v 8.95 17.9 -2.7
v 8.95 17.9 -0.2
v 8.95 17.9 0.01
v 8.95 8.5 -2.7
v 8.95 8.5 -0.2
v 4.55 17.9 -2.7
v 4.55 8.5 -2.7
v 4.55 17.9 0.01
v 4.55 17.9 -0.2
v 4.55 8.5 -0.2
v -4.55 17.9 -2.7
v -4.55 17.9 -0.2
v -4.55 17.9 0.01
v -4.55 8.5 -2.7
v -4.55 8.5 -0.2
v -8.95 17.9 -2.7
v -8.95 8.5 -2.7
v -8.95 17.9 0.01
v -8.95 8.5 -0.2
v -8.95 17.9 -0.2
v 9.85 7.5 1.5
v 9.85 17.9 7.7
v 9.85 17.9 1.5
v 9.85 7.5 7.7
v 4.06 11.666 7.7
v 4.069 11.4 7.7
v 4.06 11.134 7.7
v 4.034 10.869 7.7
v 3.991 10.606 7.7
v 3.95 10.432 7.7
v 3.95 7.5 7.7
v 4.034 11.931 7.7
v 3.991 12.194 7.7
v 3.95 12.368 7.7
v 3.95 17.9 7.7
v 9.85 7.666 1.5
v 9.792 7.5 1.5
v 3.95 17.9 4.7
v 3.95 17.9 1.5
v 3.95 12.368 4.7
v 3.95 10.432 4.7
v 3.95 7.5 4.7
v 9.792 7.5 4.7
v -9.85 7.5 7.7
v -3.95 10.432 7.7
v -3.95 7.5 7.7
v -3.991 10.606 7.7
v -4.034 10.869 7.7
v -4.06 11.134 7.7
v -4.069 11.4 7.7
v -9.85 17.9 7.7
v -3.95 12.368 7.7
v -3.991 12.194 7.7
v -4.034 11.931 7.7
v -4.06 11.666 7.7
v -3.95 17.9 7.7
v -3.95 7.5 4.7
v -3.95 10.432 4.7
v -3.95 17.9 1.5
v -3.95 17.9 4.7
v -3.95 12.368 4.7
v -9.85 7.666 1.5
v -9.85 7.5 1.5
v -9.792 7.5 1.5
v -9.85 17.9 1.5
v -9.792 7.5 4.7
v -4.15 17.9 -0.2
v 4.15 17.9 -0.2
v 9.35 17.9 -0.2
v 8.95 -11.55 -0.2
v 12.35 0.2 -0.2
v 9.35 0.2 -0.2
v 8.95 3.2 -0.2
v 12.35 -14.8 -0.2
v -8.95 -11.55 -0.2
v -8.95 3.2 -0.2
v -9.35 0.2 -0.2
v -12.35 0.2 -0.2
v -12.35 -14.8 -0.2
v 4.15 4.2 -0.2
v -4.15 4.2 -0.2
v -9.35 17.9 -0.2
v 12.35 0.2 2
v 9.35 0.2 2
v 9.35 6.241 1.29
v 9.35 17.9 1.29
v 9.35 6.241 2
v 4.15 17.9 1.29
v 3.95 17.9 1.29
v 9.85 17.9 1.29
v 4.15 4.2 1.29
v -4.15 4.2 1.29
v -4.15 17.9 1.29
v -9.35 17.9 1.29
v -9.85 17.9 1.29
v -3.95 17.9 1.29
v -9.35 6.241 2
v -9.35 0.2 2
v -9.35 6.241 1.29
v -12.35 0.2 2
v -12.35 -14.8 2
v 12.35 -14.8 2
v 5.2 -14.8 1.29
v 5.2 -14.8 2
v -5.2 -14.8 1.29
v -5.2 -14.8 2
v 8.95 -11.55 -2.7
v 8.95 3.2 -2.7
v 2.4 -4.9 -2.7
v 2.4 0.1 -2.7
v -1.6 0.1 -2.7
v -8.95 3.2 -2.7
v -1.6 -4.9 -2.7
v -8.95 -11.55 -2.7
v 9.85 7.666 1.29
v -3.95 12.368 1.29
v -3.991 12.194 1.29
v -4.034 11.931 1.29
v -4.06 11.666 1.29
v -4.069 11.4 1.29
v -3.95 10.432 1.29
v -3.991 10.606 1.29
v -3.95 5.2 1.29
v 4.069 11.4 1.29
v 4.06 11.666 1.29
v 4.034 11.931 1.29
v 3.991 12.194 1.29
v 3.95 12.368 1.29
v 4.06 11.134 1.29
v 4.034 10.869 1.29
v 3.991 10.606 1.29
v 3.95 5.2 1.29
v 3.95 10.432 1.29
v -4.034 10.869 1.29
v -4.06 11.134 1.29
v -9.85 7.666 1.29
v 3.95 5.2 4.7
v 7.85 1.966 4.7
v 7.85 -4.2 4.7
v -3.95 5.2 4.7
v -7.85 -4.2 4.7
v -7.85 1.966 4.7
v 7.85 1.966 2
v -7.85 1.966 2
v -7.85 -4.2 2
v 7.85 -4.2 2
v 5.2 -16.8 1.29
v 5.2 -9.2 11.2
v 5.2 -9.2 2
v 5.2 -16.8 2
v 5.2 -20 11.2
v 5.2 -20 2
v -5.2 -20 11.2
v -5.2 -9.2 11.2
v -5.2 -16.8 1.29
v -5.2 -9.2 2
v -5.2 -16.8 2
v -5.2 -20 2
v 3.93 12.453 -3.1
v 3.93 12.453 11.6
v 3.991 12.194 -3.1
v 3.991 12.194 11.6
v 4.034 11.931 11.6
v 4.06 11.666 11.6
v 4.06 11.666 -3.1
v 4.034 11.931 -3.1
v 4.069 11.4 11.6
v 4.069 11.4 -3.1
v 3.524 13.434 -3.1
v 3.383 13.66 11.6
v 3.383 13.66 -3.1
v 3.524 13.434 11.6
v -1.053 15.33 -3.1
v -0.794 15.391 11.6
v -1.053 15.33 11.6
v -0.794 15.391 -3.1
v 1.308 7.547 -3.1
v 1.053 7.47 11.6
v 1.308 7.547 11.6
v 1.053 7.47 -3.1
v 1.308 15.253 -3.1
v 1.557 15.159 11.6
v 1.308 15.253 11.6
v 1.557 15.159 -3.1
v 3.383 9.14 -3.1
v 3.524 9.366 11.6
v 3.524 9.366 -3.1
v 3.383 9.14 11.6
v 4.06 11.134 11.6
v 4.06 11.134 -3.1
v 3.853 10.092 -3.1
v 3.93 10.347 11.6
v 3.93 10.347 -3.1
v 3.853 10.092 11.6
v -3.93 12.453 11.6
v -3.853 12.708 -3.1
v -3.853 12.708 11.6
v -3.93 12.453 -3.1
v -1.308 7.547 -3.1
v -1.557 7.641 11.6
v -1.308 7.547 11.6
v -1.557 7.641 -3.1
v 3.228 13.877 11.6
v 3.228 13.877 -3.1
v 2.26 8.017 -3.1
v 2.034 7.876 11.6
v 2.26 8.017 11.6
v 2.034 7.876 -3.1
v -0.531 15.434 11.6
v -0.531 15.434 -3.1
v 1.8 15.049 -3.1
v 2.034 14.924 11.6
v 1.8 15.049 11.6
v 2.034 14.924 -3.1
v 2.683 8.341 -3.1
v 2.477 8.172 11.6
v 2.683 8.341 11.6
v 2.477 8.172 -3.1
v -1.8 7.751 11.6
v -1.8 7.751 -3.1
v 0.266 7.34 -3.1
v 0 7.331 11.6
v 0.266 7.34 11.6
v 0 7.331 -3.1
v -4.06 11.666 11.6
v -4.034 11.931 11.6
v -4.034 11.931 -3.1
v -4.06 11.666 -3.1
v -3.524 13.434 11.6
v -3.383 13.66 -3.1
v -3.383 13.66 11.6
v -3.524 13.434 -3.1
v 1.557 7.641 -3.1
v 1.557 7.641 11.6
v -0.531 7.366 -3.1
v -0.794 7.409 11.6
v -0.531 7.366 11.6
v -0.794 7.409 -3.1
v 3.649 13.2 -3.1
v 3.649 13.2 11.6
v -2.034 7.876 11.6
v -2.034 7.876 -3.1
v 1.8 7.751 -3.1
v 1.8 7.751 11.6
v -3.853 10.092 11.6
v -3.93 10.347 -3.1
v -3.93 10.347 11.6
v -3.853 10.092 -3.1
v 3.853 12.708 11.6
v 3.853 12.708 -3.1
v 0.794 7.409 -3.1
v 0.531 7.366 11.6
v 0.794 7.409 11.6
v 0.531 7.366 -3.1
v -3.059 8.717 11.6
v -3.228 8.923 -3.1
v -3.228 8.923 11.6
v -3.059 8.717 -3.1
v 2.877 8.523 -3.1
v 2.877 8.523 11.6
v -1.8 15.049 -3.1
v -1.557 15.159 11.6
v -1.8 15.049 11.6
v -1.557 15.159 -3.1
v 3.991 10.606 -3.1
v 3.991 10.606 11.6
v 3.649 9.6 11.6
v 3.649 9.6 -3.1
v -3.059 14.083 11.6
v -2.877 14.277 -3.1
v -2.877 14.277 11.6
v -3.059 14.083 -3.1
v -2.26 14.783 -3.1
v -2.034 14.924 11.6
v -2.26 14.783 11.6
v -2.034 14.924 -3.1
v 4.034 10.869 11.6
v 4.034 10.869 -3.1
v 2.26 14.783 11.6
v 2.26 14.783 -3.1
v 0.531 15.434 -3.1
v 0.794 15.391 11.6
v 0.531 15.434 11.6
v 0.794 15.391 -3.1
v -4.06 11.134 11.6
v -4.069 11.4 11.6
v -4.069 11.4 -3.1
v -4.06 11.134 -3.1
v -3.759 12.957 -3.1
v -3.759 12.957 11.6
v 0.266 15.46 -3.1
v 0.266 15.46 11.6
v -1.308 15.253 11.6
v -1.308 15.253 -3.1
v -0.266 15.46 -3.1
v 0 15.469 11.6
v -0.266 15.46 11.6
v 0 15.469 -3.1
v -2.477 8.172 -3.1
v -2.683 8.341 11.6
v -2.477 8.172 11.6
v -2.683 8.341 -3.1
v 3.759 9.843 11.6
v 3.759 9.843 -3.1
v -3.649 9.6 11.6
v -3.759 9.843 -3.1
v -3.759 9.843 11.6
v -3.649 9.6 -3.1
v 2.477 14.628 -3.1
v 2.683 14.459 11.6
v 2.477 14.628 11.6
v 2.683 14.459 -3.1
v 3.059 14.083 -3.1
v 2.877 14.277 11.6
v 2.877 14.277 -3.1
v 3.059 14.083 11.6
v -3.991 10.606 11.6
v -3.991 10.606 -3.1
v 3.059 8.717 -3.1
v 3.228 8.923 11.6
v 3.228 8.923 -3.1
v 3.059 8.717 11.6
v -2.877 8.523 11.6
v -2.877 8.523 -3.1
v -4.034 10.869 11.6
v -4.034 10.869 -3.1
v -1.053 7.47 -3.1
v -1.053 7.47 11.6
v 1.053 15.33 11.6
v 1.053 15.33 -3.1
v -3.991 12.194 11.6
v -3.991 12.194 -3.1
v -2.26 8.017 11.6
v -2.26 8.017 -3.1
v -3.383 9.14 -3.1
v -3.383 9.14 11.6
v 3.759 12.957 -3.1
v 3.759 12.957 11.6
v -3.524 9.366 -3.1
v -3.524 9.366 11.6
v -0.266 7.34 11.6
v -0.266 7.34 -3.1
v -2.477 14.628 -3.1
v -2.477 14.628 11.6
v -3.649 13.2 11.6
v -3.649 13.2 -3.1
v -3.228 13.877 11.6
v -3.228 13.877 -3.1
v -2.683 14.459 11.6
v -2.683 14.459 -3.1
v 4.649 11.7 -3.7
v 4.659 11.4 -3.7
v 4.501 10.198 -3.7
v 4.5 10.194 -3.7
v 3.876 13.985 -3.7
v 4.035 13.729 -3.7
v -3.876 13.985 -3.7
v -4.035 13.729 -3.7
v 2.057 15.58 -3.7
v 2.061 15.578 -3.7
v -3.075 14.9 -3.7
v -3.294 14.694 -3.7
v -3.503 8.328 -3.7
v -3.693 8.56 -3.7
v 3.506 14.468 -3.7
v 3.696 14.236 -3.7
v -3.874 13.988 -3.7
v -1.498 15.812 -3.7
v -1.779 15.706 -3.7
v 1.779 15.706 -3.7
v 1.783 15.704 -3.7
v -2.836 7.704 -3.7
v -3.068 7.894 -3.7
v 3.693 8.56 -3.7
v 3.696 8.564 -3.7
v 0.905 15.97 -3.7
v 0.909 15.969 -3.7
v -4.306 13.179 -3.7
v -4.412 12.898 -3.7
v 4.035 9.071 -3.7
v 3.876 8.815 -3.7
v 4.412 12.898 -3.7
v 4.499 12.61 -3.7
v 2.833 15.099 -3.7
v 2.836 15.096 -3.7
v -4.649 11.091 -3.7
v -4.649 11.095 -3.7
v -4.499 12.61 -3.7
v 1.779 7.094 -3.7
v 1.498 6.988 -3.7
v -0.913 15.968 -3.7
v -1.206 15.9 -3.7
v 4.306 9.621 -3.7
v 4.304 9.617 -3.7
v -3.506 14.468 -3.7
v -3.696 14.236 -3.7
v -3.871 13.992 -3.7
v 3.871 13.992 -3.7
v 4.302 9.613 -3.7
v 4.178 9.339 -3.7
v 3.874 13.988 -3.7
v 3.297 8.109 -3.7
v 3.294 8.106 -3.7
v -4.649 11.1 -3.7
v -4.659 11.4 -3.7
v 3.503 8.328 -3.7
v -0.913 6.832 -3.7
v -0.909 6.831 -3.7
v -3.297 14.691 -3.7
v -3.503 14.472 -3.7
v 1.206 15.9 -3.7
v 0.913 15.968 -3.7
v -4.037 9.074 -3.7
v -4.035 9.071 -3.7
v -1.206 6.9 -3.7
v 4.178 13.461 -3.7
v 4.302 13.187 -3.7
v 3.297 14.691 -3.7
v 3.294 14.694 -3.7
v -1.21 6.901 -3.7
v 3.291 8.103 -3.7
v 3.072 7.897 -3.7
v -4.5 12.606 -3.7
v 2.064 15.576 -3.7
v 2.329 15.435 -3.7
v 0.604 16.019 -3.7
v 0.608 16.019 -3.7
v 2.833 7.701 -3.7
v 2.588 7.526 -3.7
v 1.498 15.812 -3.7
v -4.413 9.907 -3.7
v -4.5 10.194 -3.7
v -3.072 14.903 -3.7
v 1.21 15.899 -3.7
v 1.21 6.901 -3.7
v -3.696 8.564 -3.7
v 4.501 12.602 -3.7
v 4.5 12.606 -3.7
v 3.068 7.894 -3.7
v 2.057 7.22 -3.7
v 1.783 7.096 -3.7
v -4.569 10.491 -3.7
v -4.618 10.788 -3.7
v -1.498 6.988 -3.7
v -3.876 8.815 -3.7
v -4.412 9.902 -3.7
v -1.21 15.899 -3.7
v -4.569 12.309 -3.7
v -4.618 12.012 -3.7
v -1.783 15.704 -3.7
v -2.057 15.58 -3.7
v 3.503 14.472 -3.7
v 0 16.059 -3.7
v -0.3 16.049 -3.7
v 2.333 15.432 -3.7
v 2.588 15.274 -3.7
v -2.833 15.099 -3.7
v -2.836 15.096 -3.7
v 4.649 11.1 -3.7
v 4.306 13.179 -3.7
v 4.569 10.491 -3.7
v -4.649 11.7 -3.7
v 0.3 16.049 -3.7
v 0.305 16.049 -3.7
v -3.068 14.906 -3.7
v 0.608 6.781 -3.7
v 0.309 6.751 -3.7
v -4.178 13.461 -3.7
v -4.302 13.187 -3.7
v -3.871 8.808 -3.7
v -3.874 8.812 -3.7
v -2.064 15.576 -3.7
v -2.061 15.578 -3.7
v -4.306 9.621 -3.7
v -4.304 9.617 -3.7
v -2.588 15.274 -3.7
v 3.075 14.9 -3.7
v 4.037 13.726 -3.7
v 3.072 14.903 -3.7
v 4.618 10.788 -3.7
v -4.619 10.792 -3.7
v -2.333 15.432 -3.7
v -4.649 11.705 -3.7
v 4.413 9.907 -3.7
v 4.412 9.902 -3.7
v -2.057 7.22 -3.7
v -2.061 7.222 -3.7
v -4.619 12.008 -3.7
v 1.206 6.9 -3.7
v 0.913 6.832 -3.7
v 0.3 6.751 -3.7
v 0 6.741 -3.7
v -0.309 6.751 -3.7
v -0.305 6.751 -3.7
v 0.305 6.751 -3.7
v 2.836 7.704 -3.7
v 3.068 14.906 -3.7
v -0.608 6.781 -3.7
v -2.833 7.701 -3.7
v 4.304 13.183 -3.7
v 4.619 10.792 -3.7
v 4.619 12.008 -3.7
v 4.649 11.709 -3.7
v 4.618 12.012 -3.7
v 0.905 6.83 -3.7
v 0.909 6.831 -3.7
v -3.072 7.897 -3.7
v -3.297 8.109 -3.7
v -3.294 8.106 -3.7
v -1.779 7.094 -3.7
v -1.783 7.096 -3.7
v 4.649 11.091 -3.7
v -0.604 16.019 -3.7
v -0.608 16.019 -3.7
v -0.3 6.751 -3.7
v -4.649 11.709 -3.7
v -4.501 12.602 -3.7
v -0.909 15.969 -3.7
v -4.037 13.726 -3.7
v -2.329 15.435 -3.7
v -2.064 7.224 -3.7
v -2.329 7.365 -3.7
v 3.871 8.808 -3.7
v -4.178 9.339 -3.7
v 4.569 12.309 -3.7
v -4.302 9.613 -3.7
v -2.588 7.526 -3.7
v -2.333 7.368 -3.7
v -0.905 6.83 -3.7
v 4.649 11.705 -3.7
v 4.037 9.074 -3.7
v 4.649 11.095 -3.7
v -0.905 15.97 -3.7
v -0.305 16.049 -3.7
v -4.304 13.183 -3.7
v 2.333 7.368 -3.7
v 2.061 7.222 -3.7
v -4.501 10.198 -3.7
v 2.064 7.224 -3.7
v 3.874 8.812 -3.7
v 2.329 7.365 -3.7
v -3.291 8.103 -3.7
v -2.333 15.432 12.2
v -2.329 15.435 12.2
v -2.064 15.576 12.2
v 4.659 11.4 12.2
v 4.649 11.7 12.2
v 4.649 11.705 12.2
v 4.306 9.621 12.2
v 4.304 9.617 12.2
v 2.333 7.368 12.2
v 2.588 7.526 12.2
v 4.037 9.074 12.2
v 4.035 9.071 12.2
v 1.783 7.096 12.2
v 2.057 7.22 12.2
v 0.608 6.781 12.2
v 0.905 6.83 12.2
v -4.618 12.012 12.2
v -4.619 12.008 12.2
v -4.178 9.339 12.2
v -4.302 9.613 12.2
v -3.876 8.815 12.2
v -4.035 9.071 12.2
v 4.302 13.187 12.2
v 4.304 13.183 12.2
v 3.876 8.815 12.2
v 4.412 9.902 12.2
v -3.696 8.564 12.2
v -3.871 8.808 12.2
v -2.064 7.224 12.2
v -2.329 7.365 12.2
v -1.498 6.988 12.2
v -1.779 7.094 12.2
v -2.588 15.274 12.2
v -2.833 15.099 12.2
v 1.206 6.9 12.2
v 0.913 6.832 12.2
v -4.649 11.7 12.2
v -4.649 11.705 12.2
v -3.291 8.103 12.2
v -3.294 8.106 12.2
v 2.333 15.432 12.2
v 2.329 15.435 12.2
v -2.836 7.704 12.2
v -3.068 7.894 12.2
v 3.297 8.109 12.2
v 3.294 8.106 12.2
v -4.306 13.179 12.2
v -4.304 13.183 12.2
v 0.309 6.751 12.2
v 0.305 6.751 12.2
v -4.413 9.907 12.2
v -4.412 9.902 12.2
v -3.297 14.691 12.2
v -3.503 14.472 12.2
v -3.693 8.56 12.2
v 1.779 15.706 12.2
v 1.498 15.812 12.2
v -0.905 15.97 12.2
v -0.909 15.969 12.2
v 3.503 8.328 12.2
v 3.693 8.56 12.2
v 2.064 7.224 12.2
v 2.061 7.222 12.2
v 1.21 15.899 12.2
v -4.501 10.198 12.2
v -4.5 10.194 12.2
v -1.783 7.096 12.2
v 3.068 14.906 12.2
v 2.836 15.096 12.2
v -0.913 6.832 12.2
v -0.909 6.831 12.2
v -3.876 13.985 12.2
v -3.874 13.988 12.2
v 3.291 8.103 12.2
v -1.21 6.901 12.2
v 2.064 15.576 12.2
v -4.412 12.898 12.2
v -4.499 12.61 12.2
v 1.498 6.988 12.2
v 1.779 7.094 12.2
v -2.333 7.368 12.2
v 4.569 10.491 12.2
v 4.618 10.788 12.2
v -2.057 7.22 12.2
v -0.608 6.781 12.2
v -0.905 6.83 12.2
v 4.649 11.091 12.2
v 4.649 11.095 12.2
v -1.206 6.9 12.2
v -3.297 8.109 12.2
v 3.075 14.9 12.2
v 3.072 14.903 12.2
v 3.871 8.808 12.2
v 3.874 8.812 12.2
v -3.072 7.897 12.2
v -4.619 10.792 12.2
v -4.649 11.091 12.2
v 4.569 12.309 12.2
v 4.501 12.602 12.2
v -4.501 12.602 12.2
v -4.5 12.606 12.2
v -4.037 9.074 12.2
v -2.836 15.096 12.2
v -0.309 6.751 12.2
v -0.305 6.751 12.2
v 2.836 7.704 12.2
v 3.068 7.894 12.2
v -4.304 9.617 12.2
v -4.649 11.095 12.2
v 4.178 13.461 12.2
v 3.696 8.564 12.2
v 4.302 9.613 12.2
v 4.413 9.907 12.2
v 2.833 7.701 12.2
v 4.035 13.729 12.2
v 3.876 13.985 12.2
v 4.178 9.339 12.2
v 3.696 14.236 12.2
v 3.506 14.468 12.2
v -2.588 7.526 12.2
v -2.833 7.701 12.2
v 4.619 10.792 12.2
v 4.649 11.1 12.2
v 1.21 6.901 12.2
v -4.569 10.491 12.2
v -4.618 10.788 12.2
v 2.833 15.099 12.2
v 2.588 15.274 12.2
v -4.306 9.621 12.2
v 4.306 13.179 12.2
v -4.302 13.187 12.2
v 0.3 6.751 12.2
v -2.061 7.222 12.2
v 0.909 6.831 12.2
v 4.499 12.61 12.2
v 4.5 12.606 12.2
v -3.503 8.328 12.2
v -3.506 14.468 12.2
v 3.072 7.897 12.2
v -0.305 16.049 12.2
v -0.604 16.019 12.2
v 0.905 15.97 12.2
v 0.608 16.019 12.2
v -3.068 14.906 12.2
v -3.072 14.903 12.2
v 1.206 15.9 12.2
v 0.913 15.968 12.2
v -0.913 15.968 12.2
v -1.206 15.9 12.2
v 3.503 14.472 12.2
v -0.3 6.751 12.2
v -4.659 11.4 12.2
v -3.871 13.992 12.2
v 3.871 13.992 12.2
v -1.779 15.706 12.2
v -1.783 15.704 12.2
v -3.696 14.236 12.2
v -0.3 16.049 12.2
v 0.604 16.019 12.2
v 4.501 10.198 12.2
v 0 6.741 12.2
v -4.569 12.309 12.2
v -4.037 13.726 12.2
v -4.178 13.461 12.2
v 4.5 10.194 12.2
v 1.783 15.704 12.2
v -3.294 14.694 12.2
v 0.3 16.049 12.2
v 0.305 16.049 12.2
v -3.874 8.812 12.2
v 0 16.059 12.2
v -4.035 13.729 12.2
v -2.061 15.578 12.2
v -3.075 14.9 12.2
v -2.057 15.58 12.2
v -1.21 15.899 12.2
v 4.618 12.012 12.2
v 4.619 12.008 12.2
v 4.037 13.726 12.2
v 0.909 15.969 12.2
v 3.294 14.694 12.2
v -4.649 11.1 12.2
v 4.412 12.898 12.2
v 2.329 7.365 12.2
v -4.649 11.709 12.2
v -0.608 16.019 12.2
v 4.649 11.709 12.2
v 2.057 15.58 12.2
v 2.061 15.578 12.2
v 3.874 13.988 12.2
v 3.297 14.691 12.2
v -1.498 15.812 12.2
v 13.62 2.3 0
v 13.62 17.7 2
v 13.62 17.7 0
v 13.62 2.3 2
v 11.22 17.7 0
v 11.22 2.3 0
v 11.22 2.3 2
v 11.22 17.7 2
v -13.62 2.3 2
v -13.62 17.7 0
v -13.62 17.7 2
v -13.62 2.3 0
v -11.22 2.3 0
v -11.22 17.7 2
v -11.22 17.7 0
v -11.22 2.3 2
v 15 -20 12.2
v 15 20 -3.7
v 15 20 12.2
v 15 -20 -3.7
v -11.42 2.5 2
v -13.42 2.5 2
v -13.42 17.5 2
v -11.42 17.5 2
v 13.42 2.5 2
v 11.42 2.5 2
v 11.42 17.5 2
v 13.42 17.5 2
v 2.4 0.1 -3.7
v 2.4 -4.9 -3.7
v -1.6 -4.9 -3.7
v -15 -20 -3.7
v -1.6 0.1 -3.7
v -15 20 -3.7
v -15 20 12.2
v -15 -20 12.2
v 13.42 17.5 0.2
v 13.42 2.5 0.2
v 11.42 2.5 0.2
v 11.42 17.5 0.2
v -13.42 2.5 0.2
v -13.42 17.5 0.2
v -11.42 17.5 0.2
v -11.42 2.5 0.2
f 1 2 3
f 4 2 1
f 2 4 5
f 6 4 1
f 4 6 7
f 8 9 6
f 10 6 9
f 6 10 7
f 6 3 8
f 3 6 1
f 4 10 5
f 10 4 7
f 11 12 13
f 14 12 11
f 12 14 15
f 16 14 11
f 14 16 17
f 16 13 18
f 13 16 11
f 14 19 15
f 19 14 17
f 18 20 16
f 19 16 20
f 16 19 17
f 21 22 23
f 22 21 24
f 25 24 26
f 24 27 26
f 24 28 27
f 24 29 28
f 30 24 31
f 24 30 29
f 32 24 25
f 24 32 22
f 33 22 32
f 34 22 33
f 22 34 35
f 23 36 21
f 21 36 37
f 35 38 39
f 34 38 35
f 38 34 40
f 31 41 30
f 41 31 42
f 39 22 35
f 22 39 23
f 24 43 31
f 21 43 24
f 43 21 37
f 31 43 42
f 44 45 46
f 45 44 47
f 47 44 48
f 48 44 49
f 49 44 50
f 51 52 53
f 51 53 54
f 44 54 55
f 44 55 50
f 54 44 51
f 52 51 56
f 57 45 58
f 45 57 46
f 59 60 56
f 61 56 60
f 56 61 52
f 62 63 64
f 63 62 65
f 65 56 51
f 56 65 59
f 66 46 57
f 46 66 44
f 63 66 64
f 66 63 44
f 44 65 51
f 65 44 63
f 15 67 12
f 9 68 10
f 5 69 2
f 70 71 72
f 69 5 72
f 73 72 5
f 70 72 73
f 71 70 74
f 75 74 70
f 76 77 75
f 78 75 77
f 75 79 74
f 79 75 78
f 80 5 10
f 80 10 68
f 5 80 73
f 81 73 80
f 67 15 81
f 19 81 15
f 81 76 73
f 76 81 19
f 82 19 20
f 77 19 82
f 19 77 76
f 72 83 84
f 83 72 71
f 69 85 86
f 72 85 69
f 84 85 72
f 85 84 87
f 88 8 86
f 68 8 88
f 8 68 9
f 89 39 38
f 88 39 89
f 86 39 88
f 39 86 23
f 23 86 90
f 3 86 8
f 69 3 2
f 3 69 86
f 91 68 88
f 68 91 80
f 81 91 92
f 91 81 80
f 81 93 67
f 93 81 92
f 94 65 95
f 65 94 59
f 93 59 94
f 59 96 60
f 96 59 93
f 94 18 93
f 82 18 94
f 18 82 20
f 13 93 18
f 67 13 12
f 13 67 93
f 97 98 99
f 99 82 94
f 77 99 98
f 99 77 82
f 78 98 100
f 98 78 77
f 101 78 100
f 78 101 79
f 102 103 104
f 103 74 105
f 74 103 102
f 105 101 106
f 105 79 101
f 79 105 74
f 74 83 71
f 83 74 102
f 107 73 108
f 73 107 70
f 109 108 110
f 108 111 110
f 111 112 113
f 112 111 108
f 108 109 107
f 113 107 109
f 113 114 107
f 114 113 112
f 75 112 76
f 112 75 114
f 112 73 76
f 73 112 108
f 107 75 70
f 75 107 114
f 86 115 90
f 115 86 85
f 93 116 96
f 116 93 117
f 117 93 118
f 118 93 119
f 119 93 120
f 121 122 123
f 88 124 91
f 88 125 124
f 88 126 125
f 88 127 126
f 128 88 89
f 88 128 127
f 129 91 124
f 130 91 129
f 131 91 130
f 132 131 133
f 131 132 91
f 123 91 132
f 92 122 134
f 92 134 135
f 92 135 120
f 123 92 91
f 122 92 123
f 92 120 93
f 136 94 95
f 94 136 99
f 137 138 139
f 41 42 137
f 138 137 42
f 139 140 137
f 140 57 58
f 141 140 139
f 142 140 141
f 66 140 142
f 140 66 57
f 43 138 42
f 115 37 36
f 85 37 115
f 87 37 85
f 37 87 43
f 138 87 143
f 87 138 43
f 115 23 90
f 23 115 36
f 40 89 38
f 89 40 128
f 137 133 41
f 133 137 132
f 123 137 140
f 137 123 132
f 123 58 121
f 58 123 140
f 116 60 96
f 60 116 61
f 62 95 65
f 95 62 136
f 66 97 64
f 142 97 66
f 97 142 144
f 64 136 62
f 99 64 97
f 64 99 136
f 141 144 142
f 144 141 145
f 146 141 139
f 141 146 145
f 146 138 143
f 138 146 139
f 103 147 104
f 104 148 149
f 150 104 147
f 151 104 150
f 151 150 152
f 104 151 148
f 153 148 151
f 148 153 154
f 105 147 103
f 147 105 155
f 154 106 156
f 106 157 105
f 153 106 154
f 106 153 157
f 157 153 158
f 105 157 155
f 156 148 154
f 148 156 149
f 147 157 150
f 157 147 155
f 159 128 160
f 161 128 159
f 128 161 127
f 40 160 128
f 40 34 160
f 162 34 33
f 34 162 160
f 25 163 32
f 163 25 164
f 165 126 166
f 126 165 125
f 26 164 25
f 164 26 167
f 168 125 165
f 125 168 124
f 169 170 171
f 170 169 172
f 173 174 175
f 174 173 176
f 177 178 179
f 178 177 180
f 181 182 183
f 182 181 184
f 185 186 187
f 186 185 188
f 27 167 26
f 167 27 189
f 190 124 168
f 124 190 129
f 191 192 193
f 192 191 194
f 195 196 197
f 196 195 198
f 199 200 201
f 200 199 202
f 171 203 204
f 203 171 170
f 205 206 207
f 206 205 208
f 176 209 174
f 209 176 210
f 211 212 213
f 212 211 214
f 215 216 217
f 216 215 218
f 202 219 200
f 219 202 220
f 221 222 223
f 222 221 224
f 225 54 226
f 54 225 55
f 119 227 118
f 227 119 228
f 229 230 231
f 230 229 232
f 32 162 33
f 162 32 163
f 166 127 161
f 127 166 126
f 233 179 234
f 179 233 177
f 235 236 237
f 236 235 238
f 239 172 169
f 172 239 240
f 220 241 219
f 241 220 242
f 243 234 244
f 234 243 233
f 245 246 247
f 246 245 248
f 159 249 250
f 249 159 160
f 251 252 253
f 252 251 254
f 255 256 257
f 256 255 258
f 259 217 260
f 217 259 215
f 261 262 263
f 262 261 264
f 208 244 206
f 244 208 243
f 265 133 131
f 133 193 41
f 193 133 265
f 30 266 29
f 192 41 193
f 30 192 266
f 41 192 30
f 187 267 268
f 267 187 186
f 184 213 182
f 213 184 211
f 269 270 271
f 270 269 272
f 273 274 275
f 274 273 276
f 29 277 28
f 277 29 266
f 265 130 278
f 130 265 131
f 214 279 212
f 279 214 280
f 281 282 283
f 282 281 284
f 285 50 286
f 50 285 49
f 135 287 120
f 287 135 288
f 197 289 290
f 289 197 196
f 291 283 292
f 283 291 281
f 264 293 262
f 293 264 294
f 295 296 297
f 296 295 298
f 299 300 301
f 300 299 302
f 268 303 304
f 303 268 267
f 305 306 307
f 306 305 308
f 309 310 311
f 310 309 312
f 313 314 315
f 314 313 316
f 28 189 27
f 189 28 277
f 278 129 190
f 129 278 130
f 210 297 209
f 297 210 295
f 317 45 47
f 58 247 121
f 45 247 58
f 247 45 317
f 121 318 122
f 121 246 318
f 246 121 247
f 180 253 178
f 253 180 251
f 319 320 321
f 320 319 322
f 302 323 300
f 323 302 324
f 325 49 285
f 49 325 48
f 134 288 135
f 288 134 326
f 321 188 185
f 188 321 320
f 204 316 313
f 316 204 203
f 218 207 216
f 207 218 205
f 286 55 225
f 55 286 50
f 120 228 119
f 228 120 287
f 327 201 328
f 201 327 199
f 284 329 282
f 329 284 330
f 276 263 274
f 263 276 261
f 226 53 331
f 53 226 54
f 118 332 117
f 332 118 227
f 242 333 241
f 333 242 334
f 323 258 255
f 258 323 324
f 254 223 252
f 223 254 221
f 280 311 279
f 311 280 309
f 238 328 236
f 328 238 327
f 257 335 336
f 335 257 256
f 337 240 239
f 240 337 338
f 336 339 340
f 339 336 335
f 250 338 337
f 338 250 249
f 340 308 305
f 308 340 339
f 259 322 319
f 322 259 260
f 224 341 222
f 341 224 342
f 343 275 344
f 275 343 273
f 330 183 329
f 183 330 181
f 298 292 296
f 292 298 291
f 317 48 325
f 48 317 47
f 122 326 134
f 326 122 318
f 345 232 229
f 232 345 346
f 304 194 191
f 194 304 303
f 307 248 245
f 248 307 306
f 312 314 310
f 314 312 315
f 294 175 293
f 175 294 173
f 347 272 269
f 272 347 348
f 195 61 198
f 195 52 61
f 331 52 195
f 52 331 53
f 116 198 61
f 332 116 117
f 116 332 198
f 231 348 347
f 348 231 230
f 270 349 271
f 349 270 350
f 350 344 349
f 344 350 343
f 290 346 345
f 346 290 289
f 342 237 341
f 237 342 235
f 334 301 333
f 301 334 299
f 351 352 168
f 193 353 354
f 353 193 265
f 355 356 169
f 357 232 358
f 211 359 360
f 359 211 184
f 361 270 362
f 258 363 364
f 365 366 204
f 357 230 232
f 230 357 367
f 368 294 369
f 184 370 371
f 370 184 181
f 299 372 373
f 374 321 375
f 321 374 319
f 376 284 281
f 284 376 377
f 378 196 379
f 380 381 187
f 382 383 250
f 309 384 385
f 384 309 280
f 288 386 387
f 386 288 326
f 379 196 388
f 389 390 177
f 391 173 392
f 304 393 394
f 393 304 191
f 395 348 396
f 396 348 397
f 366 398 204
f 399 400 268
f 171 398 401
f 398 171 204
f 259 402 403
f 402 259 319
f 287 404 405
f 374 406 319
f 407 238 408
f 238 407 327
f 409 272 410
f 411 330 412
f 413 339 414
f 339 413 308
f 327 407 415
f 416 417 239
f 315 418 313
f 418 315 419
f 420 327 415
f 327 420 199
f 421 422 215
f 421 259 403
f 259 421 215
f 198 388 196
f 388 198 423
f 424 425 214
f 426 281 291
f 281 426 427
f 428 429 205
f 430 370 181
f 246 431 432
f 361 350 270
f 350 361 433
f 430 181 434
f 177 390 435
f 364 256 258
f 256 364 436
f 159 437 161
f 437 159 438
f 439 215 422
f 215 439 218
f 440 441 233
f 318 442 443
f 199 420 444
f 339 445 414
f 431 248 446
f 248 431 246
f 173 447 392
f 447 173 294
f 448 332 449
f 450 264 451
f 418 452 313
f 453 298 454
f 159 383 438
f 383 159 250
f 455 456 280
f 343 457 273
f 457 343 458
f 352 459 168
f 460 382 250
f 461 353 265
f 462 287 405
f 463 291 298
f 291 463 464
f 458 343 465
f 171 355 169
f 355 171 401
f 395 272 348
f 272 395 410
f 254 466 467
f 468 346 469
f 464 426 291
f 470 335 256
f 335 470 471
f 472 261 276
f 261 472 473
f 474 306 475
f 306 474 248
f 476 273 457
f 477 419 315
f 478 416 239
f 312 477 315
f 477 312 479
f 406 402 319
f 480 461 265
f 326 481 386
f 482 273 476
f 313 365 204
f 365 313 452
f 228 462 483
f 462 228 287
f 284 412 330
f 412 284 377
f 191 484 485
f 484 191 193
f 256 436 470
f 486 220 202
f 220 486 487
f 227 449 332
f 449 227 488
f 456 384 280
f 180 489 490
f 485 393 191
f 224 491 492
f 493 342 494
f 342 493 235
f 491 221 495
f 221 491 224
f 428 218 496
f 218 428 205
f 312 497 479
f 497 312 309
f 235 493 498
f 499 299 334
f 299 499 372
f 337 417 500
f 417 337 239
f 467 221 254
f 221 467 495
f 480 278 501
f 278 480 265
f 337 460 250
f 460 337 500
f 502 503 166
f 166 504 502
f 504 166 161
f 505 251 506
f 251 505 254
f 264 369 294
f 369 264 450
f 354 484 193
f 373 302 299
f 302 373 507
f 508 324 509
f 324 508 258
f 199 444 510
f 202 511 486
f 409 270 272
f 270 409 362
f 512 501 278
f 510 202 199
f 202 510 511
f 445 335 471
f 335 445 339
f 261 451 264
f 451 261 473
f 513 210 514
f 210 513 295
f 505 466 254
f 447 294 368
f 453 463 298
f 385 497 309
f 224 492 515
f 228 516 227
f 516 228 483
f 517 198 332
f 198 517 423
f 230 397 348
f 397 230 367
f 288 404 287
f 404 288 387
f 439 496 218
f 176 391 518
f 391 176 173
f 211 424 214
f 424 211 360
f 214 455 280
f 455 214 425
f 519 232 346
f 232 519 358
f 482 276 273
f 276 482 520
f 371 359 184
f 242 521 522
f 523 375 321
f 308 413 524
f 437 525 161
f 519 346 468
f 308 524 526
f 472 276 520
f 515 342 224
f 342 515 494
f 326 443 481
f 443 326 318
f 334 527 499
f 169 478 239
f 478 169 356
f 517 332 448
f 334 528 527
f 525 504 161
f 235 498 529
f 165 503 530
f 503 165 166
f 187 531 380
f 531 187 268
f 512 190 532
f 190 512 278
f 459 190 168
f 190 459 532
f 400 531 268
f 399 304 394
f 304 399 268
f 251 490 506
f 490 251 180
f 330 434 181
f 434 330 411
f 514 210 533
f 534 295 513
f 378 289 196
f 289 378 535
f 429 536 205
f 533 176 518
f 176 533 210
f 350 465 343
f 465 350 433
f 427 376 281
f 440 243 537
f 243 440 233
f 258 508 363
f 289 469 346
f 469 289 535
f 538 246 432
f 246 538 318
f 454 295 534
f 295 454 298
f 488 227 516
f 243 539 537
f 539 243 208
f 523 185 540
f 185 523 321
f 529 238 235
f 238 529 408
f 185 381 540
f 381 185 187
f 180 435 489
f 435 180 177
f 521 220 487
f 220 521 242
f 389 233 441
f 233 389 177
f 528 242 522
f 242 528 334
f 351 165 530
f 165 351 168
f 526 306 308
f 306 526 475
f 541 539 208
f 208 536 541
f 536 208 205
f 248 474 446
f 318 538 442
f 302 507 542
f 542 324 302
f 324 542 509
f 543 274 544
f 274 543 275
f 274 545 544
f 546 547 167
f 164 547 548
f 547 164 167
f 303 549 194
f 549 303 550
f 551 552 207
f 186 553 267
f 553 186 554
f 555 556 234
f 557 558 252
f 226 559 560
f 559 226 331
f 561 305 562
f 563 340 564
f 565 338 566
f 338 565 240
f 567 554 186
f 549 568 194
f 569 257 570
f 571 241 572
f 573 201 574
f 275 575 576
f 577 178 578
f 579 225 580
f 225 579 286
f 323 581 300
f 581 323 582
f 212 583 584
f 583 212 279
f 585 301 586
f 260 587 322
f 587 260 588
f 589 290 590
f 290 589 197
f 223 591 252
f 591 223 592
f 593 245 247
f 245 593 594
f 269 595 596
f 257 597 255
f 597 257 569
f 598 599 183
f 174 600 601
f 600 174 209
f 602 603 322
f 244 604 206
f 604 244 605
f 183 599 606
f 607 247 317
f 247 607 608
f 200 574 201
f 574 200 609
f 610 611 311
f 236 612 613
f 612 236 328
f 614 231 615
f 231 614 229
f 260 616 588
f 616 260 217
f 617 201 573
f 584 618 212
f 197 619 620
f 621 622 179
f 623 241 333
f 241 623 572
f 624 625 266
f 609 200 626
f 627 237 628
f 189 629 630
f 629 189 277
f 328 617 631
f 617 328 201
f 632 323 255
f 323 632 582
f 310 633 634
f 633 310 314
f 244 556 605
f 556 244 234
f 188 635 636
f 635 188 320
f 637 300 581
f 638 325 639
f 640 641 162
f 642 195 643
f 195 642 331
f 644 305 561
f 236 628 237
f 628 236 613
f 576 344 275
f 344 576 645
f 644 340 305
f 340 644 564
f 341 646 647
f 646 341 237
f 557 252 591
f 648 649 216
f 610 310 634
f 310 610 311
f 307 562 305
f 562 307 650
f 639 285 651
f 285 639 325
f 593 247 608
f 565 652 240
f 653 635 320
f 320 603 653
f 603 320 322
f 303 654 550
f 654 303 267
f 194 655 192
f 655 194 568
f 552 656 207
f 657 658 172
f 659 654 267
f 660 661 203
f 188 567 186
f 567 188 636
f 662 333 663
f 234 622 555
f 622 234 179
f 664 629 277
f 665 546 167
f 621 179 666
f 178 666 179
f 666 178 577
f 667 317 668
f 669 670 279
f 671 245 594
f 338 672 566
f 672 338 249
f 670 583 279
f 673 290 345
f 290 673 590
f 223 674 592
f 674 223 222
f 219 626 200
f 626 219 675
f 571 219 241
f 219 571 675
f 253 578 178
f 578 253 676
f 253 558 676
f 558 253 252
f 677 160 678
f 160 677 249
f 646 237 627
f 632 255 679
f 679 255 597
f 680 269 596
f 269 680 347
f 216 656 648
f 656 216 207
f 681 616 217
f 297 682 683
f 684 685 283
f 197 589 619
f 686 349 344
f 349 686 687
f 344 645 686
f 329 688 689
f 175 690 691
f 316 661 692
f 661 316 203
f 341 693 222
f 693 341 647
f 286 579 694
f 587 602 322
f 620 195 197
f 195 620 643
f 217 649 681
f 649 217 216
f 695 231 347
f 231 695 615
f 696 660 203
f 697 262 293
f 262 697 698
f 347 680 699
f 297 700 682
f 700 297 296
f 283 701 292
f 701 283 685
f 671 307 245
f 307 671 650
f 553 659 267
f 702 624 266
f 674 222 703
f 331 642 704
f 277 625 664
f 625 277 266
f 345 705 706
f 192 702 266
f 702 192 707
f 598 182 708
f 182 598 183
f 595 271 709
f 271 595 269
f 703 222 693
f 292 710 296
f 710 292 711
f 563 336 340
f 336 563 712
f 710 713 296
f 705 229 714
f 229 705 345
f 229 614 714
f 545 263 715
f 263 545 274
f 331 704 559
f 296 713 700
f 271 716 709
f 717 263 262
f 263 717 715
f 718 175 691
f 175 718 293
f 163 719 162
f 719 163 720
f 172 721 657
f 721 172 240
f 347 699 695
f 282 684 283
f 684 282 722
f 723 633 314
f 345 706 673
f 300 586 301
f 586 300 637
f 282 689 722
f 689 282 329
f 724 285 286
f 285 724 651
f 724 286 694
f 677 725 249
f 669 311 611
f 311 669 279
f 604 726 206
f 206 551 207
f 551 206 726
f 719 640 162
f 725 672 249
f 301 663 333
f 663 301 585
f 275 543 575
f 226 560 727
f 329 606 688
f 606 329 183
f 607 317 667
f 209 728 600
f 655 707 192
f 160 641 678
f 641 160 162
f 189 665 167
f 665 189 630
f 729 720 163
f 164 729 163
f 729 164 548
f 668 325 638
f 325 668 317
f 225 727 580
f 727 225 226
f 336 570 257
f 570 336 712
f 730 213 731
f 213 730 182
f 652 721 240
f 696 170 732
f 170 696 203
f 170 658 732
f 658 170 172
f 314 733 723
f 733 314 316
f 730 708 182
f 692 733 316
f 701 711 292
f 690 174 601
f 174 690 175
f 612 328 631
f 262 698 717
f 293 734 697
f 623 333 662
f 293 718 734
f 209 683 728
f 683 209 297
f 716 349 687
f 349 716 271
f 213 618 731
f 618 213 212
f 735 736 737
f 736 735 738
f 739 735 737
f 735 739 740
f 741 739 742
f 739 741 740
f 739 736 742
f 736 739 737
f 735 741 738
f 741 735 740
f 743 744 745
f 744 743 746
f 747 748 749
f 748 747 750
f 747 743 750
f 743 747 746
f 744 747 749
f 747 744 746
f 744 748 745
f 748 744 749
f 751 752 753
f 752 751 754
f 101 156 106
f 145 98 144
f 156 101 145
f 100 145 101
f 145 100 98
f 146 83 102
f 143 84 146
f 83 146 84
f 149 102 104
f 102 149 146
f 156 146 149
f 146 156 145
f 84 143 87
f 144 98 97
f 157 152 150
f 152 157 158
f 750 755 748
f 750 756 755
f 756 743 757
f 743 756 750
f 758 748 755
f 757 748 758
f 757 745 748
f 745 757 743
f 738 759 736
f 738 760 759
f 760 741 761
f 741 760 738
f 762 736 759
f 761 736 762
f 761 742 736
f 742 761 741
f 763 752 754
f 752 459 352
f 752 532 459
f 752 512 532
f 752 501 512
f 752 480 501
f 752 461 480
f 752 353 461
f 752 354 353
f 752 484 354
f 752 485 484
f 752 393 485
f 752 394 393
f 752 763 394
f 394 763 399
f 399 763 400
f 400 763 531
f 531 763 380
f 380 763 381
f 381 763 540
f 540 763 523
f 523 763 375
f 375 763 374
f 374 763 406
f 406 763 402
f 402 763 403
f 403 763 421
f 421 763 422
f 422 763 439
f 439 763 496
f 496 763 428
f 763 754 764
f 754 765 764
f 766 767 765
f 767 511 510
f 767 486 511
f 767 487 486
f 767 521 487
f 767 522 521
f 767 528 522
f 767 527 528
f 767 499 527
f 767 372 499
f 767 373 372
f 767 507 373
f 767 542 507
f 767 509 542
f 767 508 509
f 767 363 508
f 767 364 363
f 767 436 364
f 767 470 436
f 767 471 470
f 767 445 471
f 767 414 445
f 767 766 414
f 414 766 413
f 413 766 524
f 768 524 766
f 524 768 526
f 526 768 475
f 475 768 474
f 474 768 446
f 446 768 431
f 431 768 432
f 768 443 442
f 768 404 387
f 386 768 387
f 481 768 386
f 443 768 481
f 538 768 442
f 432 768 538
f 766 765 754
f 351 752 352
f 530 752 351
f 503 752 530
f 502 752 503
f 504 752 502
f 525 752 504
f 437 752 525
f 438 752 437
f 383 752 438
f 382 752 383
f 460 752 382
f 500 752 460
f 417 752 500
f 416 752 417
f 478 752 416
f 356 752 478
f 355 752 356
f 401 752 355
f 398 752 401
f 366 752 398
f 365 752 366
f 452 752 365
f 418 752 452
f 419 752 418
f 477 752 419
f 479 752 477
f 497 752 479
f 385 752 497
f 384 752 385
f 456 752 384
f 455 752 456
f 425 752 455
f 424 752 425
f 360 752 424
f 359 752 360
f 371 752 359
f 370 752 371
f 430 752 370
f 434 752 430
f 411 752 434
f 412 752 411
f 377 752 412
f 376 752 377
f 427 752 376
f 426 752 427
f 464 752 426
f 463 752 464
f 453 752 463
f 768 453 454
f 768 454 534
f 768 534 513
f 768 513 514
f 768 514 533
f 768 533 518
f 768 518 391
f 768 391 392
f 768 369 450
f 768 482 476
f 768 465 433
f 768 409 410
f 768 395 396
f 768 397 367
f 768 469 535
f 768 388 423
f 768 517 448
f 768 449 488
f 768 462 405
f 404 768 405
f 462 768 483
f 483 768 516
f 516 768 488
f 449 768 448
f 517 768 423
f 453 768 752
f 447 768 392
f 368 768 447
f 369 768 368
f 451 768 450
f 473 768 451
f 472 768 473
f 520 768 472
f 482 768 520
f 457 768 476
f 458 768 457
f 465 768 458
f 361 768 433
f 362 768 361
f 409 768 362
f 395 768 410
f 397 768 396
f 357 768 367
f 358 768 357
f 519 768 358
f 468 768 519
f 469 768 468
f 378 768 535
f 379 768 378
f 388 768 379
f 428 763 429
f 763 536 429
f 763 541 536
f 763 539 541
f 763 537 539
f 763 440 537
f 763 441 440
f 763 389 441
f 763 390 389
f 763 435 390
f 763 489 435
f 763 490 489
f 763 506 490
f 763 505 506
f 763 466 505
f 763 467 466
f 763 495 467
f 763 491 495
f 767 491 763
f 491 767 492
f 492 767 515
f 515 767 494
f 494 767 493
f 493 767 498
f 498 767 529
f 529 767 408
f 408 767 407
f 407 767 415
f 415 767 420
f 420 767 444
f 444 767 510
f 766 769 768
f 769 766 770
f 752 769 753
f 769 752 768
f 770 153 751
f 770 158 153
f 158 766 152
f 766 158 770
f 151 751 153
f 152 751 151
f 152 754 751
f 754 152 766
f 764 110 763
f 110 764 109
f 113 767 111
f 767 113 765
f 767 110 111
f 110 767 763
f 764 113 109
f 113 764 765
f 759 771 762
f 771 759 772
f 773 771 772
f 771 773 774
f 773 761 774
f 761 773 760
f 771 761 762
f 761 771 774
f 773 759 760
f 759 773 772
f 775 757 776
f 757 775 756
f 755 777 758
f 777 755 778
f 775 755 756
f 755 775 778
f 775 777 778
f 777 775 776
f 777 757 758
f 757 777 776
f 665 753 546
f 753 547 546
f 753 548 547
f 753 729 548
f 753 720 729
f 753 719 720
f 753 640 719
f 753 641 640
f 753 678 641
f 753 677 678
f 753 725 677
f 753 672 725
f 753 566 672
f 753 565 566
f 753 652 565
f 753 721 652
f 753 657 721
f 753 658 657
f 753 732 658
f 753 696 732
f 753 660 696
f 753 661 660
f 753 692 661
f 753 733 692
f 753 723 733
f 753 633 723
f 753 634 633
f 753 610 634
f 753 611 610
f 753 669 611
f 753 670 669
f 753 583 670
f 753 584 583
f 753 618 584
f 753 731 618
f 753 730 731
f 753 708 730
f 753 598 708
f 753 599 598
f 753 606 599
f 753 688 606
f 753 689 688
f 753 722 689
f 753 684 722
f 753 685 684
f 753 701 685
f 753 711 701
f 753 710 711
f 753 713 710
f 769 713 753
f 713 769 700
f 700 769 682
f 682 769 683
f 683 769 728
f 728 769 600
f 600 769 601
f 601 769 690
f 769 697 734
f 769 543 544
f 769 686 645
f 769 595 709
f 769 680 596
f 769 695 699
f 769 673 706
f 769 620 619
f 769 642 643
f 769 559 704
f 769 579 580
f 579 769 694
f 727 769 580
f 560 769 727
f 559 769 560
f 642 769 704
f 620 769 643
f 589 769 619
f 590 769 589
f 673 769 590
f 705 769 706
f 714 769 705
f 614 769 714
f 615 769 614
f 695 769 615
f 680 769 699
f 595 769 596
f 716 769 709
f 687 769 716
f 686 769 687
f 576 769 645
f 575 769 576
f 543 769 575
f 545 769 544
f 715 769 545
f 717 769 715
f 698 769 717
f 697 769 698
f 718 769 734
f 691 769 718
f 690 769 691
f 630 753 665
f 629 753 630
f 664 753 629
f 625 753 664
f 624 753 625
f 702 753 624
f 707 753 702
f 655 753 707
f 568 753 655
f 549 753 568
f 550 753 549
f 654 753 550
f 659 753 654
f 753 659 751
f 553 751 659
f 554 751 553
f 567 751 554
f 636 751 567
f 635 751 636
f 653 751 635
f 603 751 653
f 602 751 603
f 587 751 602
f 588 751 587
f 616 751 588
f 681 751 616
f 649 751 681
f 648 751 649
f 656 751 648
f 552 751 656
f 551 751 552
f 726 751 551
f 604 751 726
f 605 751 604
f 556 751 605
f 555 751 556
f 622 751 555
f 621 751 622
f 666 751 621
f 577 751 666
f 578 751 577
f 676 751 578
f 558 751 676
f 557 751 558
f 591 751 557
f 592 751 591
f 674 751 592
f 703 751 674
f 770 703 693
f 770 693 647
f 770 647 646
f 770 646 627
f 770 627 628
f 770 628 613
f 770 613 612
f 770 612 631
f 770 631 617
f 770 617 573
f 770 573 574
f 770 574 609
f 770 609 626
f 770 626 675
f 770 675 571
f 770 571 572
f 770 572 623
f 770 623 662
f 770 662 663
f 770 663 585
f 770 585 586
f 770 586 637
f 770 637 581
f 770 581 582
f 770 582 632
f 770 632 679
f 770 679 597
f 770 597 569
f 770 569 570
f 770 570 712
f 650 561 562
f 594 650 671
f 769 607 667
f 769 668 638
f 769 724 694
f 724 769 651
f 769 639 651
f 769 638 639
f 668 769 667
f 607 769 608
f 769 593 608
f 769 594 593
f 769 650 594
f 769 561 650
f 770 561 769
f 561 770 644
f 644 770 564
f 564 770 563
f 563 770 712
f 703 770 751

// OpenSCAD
// Printed flow-through case for the bare DFRobot SEN0189 probe board.
//
// The stock probe housing is removed. The bare probe PCB (emitter and detector
// heads on a U-shaped bracket, right-angle 3-pin connector) drops into the base,
// the lid closes over it, and a clear tube runs vertically through the optical
// slot between the heads.
//
// Frame: origin on the PCB centreline, z = 0 at the PCB underside, +y toward the
// head arms, -y toward the connector. The base sits below z = split_z, the lid above.
//
// Every pocket in both parts is cut from one board envelope grown by `clr`, so the
// two parts cannot disagree about where the board is. The board envelope comes
// from a CAD model of the board, not from measurement: check it with calipers
// before relying on a fit.
//
// Export both parts with `just case`.

/* [Output] */

// which part(s) to render
part = "assembly"; // [assembly, base, lid]
// print: each part flat side down at z = 0
orient = "assembly"; // [assembly, print]

/* [Fit] */
// clearance around the board envelope, per side
clr = 0.2; // [0:0.05:0.5]
// 5/16 in clear tube, nominal outside diameter
tube_od = 7.9375; // [5:0.0025:8.2]
// added to tube_od for the bore diameter
tube_fit = 0.2; // [0:0.05:0.8]
// 45 degree chamfer at each outer end of the tube bore
lead_in = 0.6; // [0:0.1:1.5]
// Number of facets for circular features (higher = smoother)
facets = 96; // [24:8:192]

/* [Case] */
// outside width (x)
case_w = 30;
// outside length (y)
case_l = 40;
// floor below the underside relief
floor_t = 1.0;
// roof above the connector pocket
roof_t = 1.0;
// base/lid parting plane; the PCB top is pcb_t, so the PCB sits recessed
split_z = 2.0;
// tube axis, centred between the heads in x
tube_y = 11.4;
// hole under the RV trimmer (docs/hardware.md: do not adjust RV)
access_hole = true;

/* [Alignment keys] */
// key centreline, mirrored in x
key_x = 12.42;
// key start (y)
key_y0 = 2.5;
// key end (y)
key_y1 = 17.5;
// key width
key_w = 2.0;
// ridge height below the lid; the groove is key_h + key_clr deep
key_h = 1.8;
// clearance around the keys, per side
key_clr = 0.2; // [0:0.05:0.5]

/* [Board envelope: measure your board] */
// PCB thickness
pcb_t = 1.5;
// half-width of the PCB body
pcb_hw = 12.15;
// connector-end edge (y)
pcb_y0 = -14.6;
// where the PCB narrows to the two arms (y)
pcb_neck_y = 0.0;
// arm inner edge (half the slot width)
pcb_arm_x0 = 4.35;
// arm outer edge
pcb_arm_x1 = 9.15;
// bottom of the PCB slot (y)
pcb_slot_y = 4.0;
// arm tips (y)
pcb_y1 = 17.7;

// top of the black head bracket (z)
bracket_top = 4.5;
// bracket root edge (y)
bracket_y0 = -4.0;
// bracket half-width at the root
bracket_hw0 = 7.65;
// the root widens to the head width from here (y)
flare_y0 = 2.0;
// to here (y)
flare_y1 = 7.7;
// head inner face (half the optical gap)
head_x0 = 4.15;
// head outer face
head_x1 = 9.65;
// bottom of the bracket slot (y)
bracket_slot_y = 5.0;

// top of the emitter and detector heads (z), over y flare_y1..pcb_y1
head_top = 7.5;

// right-angle connector half-width; the plug enters from -y
conn_hw = 5.0;
// connector plug face (y)
conn_y0 = -16.6;
// connector back face (y)
conn_y1 = -9.4;
// connector top (z)
conn_top = 11.0;

// depth of the solder joints, trimmer and legs below the PCB
under_d = 2.5;
// main underside relief half-width
under_hw = 8.75;
// main relief start (y)
under_y0 = -11.35;
// main relief end (y)
under_y1 = 3.0;
// inner edge of the relief under each arm
under_arm_x0 = 4.75;
// start of the relief under each arm (y)
under_arm_y0 = 8.7;
// RV trimmer centre, underside (x)
trim_x = 0.4;
// RV trimmer centre, underside (y)
trim_y = -2.4;
// access hole width (x)
trim_w = 4.0;
// access hole length (y)
trim_l = 5.0;

/* [Hidden] */
eps = 0.01;
bot_z = -(under_d + clr + floor_t);
top_z = conn_top + clr + roof_t;
bore_d = tube_od + tube_fit;

module mirror_x() {
  children();
  mirror([1, 0, 0]) children();
}

module box(x0, x1, y0, y1, z0, z1) {
  translate([x0, y0, z0]) cube([x1 - x0, y1 - y0, z1 - z0]);
}

module pcb_outline() {
  polygon(
    [
      [-pcb_hw, pcb_y0],
      [pcb_hw, pcb_y0],
      [pcb_hw, pcb_neck_y],
      [pcb_arm_x1, pcb_neck_y],
      [pcb_arm_x1, pcb_y1],
      [pcb_arm_x0, pcb_y1],
      [pcb_arm_x0, pcb_slot_y],
      [-pcb_arm_x0, pcb_slot_y],
      [-pcb_arm_x0, pcb_y1],
      [-pcb_arm_x1, pcb_y1],
      [-pcb_arm_x1, pcb_neck_y],
      [-pcb_hw, pcb_neck_y],
    ]
  );
}

module bracket_outline() {
  polygon(
    [
      [-bracket_hw0, bracket_y0],
      [bracket_hw0, bracket_y0],
      [bracket_hw0, flare_y0],
      [head_x1, flare_y1],
      [head_x1, pcb_y1],
      [head_x0, pcb_y1],
      [head_x0, bracket_slot_y],
      [-head_x0, bracket_slot_y],
      [-head_x0, pcb_y1],
      [-head_x1, pcb_y1],
      [-head_x1, flare_y1],
      [-bracket_hw0, flare_y0],
    ]
  );
}

// The board, grown by c on every side. c = 0 is the board itself.
module board(c = 0) {
  // PCB
  translate([0, 0, -c]) linear_extrude(pcb_t + 2 * c) offset(delta=c) pcb_outline();
  // underside relief
  box(-under_hw - c, under_hw + c, under_y0 - c, under_y1 + c, -under_d - c, eps);
  mirror_x() box(under_arm_x0 - c, under_hw + c, under_arm_y0 - c, pcb_y1 + c, -under_d - c, eps);
  // bracket, heads, connector
  // (both overhang the PCB edge, so they get clearance underneath too)
  translate([0, 0, pcb_t - c - eps]) linear_extrude(bracket_top - pcb_t + 2 * c + eps) offset(delta=c) bracket_outline();
  mirror_x() box(head_x0 - c, head_x1 + c, flare_y1 - c, pcb_y1 + c, pcb_t, head_top + c);
  box(-conn_hw - c, conn_hw + c, conn_y0 - c, conn_y1 + c, pcb_t - c - eps, conn_top + c);
}

module tube_bore() {
  translate([0, tube_y, bot_z - 1]) cylinder(d=bore_d, h=top_z - bot_z + 2, $fn=facets);
  translate([0, tube_y, bot_z - eps])
    cylinder(d1=bore_d + 2 * lead_in, d2=bore_d, h=lead_in + eps, $fn=facets);
  translate([0, tube_y, top_z - lead_in])
    cylinder(d1=bore_d, d2=bore_d + 2 * lead_in, h=lead_in + eps, $fn=facets);
}

module keys(grow = 0, extra_h = 0) {
  mirror_x() box(
      key_x - key_w / 2 - grow, key_x + key_w / 2 + grow,
      key_y0 - grow, key_y1 + grow,
      split_z - key_h - extra_h, split_z + eps
    );
}

module base() {
  difference() {
    box(-case_w / 2, case_w / 2, -case_l / 2, case_l / 2, bot_z, split_z);
    board(clr);
    // open the PCB pocket to the parting plane so the board drops in
    linear_extrude(split_z + 1) offset(delta=clr) pcb_outline();
    tube_bore();
    keys(grow=key_clr, extra_h=key_clr);
    if (access_hole)
      box(
        trim_x - trim_w / 2, trim_x + trim_w / 2, trim_y - trim_l / 2, trim_y + trim_l / 2,
        bot_z - 1, 0
      );
  }
}

module lid() {
  difference() {
    union() {
      box(-case_w / 2, case_w / 2, -case_l / 2, case_l / 2, split_z, top_z);
      keys();
    }
    board(clr);
    // connector window: the plug enters through the -y wall
    box(-conn_hw - clr, conn_hw + clr, -case_l / 2 - 1, conn_y1, split_z - 1, conn_top + clr);
    tube_bore();
  }
}

module tube() {
  translate([0, tube_y, bot_z - 5]) cylinder(d=tube_od, h=top_z - bot_z + 10, $fn=facets);
}

if (part == "base") {
  if (orient == "print")
    translate([0, 0, -bot_z]) base();
  else
    base();
} else if (part == "lid") {
  if (orient == "print")
    translate([0, 0, top_z]) rotate([180, 0, 0]) lid();
  else
    lid();
} else {
  color("orange") base();
  color("gray", 0.5) lid();
  %board();
  %tube();
}
